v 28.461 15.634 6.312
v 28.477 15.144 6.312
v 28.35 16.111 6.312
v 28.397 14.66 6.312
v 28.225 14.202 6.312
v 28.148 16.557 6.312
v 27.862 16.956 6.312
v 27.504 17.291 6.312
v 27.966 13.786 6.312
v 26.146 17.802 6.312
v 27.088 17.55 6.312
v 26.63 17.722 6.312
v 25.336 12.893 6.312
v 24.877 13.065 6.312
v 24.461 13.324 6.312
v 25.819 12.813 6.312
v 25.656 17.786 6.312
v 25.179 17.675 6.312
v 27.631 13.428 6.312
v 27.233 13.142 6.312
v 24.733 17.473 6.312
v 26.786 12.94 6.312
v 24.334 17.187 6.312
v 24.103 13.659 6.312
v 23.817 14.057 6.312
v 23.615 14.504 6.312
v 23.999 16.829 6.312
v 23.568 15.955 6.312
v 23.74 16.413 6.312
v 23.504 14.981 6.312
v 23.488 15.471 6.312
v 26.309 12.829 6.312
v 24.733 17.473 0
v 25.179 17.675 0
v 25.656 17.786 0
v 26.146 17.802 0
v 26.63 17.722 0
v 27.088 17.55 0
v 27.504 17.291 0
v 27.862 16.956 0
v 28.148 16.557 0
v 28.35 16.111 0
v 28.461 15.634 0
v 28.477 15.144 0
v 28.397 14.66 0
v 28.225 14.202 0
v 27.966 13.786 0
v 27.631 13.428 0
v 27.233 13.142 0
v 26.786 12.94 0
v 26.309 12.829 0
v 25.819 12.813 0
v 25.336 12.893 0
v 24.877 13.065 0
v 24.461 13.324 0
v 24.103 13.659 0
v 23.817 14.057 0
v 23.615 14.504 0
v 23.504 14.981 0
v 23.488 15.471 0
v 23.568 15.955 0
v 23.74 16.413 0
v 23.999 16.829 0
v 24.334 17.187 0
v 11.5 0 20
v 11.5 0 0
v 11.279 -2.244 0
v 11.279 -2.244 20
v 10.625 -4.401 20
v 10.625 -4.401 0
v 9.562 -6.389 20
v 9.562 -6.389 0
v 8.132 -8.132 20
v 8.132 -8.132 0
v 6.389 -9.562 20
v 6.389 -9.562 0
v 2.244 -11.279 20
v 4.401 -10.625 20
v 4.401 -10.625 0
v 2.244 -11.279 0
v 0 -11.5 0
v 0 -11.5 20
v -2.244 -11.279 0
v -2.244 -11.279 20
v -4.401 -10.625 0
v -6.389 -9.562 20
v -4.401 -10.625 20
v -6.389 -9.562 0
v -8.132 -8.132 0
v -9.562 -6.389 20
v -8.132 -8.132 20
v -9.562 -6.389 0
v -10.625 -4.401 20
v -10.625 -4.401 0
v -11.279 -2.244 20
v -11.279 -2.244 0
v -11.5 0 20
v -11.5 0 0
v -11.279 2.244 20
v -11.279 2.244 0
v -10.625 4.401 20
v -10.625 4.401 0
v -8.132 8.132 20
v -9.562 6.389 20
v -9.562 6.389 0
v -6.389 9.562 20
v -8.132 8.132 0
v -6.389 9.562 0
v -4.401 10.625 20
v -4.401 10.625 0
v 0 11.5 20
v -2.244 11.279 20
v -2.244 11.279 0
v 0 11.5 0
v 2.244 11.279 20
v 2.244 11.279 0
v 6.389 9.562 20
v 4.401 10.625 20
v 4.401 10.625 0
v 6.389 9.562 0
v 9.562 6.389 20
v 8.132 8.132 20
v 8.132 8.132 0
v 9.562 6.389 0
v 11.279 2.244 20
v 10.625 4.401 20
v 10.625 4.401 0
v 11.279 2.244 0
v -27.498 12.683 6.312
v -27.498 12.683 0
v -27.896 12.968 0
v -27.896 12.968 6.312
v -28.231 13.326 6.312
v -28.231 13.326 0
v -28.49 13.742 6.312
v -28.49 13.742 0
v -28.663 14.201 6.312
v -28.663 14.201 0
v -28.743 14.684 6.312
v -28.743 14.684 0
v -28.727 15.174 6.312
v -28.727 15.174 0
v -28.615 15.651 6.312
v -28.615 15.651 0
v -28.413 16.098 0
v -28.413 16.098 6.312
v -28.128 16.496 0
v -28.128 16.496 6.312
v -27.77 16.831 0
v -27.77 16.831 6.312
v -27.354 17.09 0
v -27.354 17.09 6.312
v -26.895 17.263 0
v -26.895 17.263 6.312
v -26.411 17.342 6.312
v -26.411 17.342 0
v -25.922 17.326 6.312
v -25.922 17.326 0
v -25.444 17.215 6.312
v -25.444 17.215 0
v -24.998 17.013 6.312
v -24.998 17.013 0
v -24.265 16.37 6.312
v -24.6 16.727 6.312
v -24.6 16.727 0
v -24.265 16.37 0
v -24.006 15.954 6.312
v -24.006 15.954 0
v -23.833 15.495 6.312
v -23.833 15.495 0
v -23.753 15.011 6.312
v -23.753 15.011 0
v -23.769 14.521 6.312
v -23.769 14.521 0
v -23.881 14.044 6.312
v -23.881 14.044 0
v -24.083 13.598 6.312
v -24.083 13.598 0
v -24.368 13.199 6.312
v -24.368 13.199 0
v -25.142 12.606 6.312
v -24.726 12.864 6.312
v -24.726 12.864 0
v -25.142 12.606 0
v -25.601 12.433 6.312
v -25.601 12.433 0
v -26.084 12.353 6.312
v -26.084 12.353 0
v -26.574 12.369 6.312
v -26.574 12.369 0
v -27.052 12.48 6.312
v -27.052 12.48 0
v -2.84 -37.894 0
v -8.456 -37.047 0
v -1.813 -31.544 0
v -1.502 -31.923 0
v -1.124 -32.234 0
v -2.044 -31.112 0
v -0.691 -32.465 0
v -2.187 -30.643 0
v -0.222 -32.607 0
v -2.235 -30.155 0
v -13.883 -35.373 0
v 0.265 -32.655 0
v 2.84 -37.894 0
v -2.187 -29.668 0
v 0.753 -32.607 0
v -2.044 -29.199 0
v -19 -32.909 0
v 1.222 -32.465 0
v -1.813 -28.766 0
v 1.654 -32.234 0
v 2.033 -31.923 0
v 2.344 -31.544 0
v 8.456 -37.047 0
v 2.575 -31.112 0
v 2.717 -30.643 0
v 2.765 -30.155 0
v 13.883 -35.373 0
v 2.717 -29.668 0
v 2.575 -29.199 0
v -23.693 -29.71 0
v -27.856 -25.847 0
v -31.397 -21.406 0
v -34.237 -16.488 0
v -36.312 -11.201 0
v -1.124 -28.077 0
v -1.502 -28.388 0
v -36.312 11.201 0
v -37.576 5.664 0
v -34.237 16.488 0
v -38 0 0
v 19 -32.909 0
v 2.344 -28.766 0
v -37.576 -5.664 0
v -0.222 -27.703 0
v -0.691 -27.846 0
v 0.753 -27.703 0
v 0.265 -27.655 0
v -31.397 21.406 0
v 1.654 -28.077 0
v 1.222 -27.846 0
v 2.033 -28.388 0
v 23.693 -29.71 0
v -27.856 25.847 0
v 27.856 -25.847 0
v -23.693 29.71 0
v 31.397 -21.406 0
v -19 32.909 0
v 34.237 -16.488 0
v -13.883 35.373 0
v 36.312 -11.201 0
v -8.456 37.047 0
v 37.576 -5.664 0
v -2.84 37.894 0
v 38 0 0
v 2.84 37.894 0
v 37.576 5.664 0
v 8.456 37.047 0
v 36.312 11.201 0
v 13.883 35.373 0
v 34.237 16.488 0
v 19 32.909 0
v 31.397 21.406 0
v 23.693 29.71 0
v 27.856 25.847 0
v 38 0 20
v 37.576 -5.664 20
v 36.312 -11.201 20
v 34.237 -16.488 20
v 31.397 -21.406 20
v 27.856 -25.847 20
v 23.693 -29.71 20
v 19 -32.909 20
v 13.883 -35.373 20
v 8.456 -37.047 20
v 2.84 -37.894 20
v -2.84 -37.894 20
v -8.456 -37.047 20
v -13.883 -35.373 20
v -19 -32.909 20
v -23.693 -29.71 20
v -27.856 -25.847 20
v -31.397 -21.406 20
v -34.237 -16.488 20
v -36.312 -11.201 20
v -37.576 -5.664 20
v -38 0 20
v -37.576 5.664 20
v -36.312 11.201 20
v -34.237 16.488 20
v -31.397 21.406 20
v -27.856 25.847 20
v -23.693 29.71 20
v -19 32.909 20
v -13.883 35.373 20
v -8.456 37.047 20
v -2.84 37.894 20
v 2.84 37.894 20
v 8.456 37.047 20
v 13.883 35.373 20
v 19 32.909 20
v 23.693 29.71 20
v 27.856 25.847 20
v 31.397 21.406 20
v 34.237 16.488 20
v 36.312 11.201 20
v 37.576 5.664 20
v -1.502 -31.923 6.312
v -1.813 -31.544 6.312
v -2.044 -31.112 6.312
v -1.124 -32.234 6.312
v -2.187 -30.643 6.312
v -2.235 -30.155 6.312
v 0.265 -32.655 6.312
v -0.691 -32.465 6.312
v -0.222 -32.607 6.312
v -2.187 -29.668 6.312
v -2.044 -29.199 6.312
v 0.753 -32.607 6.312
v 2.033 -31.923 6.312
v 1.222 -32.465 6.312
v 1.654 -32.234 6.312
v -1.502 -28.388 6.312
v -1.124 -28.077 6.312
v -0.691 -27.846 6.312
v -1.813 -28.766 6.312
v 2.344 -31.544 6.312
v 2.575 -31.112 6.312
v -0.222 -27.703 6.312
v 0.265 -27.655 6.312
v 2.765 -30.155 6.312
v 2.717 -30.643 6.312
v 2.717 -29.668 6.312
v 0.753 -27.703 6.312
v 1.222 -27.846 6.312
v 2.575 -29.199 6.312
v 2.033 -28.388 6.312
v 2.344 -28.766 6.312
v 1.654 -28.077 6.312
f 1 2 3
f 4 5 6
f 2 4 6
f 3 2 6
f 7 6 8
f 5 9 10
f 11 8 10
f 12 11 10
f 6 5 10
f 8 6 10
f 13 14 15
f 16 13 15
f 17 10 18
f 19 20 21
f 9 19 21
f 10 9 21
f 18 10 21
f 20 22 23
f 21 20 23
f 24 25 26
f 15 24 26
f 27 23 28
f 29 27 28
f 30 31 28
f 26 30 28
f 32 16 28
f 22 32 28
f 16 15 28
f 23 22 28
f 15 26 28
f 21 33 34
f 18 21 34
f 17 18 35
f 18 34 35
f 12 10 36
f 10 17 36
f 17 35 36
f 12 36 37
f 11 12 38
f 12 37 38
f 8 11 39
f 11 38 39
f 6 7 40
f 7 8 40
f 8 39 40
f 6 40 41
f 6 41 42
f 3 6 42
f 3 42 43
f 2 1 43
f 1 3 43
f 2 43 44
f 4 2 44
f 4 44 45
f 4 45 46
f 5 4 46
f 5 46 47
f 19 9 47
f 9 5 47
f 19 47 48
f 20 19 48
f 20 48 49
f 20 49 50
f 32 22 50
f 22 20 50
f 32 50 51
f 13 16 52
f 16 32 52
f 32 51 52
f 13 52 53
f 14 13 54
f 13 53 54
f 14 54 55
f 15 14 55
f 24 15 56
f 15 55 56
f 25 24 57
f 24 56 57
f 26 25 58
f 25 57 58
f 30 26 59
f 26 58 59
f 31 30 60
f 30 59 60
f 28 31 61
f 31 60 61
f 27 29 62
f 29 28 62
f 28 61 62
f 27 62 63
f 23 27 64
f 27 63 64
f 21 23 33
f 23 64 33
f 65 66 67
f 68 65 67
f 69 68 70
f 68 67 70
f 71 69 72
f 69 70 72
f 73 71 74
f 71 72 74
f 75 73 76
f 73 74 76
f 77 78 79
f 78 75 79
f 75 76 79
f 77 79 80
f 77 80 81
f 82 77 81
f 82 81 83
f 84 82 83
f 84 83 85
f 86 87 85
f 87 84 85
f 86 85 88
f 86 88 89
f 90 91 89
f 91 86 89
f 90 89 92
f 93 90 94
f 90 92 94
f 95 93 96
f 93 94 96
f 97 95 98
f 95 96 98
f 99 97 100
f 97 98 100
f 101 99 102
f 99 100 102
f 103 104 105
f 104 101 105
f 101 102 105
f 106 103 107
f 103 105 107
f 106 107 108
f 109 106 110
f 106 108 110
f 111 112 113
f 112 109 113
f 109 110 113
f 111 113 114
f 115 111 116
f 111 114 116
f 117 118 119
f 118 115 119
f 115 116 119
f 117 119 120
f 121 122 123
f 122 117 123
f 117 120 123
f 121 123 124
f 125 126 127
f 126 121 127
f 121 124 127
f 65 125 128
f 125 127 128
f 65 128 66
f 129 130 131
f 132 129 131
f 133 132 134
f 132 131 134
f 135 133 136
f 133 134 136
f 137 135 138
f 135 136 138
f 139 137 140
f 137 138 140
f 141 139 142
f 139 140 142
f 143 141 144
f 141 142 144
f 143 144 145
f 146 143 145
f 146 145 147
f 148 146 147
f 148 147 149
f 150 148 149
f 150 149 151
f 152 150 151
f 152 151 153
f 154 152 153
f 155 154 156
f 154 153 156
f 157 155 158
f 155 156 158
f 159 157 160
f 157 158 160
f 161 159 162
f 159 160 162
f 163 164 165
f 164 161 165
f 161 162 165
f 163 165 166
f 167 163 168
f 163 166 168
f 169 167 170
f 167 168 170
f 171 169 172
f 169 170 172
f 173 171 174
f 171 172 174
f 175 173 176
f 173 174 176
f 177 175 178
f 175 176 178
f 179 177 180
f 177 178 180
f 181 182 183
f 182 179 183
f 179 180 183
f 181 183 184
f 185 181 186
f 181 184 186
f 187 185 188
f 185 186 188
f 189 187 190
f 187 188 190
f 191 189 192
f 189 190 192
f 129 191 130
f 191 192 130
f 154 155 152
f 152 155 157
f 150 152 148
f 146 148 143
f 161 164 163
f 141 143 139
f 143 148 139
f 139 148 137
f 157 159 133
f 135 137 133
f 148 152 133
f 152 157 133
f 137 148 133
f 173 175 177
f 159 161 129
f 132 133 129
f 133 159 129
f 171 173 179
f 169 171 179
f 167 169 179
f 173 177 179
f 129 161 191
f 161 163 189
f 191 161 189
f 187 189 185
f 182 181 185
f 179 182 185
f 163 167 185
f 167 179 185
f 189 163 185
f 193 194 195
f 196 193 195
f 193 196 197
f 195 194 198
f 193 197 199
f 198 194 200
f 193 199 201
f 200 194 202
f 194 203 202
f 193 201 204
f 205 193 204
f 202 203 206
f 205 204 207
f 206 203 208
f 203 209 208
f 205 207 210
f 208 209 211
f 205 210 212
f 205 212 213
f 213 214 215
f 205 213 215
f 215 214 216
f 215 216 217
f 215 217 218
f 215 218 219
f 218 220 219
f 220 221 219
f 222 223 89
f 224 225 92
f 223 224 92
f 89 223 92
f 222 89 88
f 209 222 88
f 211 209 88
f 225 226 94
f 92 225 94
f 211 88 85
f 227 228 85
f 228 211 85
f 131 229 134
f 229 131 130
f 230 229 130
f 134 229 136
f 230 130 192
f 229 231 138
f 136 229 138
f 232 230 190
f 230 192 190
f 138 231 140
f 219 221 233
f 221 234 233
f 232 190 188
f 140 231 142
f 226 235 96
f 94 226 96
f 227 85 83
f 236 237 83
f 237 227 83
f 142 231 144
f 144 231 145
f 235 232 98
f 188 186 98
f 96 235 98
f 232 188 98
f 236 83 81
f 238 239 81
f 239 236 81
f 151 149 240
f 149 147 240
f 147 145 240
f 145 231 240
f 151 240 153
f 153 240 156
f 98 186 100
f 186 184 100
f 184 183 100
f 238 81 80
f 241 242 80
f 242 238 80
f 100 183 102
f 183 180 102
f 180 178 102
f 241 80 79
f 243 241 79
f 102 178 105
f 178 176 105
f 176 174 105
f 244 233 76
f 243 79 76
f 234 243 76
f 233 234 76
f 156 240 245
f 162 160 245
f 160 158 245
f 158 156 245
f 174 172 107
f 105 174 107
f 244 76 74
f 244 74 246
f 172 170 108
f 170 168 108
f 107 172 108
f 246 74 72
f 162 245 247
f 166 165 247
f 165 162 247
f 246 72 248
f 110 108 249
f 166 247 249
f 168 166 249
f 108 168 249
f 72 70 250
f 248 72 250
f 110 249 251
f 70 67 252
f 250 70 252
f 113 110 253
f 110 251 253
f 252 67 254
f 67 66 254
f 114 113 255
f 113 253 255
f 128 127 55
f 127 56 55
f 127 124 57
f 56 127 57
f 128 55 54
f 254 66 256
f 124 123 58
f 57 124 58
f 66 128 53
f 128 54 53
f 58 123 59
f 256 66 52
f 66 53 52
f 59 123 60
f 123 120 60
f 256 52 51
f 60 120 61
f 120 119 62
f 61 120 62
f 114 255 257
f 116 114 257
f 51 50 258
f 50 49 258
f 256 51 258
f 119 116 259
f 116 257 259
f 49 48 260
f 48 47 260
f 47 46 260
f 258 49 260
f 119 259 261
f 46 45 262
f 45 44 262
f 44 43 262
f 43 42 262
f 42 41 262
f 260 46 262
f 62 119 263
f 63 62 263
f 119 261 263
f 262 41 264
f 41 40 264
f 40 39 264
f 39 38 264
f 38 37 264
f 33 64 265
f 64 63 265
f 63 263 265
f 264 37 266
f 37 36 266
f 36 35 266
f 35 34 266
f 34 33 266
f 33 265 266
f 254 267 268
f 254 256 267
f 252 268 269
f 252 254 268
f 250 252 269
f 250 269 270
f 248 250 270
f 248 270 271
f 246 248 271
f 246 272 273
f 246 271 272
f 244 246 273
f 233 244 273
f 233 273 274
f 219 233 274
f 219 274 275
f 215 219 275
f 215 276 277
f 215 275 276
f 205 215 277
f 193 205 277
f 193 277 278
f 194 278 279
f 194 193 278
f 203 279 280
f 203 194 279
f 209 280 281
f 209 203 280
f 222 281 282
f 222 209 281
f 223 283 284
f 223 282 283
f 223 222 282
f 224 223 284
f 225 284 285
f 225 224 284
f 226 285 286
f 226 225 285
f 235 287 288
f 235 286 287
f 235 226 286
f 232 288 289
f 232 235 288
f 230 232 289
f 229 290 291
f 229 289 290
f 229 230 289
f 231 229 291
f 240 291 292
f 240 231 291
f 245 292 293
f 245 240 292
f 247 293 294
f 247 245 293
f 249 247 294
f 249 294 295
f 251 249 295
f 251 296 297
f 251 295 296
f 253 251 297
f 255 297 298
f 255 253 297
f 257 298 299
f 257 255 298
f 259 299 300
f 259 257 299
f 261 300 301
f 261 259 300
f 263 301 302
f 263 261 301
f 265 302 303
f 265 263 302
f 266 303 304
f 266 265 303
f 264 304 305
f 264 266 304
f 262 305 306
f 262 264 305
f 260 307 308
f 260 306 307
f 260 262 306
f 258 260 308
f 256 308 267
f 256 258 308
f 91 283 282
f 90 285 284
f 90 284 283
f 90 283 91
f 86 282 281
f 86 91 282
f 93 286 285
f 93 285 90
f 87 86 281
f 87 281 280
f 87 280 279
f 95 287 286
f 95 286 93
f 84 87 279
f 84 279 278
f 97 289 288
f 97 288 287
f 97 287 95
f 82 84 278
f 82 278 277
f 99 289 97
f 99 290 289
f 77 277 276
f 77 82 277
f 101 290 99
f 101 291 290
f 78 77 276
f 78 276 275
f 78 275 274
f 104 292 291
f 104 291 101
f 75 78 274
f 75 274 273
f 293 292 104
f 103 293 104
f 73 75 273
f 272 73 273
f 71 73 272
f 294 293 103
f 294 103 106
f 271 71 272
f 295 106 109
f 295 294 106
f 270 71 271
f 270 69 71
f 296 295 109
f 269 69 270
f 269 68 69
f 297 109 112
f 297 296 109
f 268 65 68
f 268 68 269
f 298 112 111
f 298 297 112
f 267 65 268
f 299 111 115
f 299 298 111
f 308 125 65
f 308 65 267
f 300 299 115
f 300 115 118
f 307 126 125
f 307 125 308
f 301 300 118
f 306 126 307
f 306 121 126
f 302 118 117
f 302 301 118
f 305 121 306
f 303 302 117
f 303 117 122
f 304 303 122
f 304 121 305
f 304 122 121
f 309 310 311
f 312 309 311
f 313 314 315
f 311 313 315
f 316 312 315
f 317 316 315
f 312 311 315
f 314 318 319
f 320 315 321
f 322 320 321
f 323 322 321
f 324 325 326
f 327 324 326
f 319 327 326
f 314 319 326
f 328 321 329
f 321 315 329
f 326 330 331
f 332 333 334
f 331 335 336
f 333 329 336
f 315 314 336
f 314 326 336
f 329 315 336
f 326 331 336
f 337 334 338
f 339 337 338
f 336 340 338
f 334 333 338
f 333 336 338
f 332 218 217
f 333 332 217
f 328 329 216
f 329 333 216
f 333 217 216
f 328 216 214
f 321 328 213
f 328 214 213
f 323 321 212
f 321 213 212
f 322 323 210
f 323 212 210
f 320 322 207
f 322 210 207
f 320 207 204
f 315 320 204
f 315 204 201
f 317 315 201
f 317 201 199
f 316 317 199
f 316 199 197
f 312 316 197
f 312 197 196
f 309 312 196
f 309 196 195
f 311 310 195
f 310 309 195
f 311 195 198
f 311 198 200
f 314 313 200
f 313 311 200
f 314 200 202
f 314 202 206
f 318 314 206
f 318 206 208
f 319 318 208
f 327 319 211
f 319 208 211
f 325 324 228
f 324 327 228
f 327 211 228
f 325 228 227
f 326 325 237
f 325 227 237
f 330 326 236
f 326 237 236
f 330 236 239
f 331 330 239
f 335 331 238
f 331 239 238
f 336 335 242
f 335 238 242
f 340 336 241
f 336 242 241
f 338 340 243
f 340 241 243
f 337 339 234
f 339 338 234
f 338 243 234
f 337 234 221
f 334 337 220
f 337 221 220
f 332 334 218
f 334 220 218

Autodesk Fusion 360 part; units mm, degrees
sketch "Sketch1" plane through (0, 0, 0) normal (0, 0, 1) x (1, 0, 0)
  circle A0 centre (0, 0) radius 11.5
  circle A1 centre (0, 0) radius 22.5
  circle A2 centre (0, 0) radius 38
  dimension "d1" = 45
  dimension "d2" = 23
  dimension "d3" = 76
extrude "Extrude1" add sketch "Sketch1" along normal blind 20 contours A1
sketch "Sketch2" plane through (0, 0, 0) normal (0, 0, 1) x (1, 0, 0)
  circle A0 centre (0.2654, -30.1553) radius 2.5
  dimension "d8" = 5
extrude "Extrude4" add sketch "Sketch1" along normal blind 20 contours A1 | A2
extrude "Extrude5" cut sketch "Sketch2" along normal blind 6.312
pattern_circular "C-Pattern2" count 3 over 360 about axis through (0, 0, 20) along (0, 0, 1) of "Extrude5"
